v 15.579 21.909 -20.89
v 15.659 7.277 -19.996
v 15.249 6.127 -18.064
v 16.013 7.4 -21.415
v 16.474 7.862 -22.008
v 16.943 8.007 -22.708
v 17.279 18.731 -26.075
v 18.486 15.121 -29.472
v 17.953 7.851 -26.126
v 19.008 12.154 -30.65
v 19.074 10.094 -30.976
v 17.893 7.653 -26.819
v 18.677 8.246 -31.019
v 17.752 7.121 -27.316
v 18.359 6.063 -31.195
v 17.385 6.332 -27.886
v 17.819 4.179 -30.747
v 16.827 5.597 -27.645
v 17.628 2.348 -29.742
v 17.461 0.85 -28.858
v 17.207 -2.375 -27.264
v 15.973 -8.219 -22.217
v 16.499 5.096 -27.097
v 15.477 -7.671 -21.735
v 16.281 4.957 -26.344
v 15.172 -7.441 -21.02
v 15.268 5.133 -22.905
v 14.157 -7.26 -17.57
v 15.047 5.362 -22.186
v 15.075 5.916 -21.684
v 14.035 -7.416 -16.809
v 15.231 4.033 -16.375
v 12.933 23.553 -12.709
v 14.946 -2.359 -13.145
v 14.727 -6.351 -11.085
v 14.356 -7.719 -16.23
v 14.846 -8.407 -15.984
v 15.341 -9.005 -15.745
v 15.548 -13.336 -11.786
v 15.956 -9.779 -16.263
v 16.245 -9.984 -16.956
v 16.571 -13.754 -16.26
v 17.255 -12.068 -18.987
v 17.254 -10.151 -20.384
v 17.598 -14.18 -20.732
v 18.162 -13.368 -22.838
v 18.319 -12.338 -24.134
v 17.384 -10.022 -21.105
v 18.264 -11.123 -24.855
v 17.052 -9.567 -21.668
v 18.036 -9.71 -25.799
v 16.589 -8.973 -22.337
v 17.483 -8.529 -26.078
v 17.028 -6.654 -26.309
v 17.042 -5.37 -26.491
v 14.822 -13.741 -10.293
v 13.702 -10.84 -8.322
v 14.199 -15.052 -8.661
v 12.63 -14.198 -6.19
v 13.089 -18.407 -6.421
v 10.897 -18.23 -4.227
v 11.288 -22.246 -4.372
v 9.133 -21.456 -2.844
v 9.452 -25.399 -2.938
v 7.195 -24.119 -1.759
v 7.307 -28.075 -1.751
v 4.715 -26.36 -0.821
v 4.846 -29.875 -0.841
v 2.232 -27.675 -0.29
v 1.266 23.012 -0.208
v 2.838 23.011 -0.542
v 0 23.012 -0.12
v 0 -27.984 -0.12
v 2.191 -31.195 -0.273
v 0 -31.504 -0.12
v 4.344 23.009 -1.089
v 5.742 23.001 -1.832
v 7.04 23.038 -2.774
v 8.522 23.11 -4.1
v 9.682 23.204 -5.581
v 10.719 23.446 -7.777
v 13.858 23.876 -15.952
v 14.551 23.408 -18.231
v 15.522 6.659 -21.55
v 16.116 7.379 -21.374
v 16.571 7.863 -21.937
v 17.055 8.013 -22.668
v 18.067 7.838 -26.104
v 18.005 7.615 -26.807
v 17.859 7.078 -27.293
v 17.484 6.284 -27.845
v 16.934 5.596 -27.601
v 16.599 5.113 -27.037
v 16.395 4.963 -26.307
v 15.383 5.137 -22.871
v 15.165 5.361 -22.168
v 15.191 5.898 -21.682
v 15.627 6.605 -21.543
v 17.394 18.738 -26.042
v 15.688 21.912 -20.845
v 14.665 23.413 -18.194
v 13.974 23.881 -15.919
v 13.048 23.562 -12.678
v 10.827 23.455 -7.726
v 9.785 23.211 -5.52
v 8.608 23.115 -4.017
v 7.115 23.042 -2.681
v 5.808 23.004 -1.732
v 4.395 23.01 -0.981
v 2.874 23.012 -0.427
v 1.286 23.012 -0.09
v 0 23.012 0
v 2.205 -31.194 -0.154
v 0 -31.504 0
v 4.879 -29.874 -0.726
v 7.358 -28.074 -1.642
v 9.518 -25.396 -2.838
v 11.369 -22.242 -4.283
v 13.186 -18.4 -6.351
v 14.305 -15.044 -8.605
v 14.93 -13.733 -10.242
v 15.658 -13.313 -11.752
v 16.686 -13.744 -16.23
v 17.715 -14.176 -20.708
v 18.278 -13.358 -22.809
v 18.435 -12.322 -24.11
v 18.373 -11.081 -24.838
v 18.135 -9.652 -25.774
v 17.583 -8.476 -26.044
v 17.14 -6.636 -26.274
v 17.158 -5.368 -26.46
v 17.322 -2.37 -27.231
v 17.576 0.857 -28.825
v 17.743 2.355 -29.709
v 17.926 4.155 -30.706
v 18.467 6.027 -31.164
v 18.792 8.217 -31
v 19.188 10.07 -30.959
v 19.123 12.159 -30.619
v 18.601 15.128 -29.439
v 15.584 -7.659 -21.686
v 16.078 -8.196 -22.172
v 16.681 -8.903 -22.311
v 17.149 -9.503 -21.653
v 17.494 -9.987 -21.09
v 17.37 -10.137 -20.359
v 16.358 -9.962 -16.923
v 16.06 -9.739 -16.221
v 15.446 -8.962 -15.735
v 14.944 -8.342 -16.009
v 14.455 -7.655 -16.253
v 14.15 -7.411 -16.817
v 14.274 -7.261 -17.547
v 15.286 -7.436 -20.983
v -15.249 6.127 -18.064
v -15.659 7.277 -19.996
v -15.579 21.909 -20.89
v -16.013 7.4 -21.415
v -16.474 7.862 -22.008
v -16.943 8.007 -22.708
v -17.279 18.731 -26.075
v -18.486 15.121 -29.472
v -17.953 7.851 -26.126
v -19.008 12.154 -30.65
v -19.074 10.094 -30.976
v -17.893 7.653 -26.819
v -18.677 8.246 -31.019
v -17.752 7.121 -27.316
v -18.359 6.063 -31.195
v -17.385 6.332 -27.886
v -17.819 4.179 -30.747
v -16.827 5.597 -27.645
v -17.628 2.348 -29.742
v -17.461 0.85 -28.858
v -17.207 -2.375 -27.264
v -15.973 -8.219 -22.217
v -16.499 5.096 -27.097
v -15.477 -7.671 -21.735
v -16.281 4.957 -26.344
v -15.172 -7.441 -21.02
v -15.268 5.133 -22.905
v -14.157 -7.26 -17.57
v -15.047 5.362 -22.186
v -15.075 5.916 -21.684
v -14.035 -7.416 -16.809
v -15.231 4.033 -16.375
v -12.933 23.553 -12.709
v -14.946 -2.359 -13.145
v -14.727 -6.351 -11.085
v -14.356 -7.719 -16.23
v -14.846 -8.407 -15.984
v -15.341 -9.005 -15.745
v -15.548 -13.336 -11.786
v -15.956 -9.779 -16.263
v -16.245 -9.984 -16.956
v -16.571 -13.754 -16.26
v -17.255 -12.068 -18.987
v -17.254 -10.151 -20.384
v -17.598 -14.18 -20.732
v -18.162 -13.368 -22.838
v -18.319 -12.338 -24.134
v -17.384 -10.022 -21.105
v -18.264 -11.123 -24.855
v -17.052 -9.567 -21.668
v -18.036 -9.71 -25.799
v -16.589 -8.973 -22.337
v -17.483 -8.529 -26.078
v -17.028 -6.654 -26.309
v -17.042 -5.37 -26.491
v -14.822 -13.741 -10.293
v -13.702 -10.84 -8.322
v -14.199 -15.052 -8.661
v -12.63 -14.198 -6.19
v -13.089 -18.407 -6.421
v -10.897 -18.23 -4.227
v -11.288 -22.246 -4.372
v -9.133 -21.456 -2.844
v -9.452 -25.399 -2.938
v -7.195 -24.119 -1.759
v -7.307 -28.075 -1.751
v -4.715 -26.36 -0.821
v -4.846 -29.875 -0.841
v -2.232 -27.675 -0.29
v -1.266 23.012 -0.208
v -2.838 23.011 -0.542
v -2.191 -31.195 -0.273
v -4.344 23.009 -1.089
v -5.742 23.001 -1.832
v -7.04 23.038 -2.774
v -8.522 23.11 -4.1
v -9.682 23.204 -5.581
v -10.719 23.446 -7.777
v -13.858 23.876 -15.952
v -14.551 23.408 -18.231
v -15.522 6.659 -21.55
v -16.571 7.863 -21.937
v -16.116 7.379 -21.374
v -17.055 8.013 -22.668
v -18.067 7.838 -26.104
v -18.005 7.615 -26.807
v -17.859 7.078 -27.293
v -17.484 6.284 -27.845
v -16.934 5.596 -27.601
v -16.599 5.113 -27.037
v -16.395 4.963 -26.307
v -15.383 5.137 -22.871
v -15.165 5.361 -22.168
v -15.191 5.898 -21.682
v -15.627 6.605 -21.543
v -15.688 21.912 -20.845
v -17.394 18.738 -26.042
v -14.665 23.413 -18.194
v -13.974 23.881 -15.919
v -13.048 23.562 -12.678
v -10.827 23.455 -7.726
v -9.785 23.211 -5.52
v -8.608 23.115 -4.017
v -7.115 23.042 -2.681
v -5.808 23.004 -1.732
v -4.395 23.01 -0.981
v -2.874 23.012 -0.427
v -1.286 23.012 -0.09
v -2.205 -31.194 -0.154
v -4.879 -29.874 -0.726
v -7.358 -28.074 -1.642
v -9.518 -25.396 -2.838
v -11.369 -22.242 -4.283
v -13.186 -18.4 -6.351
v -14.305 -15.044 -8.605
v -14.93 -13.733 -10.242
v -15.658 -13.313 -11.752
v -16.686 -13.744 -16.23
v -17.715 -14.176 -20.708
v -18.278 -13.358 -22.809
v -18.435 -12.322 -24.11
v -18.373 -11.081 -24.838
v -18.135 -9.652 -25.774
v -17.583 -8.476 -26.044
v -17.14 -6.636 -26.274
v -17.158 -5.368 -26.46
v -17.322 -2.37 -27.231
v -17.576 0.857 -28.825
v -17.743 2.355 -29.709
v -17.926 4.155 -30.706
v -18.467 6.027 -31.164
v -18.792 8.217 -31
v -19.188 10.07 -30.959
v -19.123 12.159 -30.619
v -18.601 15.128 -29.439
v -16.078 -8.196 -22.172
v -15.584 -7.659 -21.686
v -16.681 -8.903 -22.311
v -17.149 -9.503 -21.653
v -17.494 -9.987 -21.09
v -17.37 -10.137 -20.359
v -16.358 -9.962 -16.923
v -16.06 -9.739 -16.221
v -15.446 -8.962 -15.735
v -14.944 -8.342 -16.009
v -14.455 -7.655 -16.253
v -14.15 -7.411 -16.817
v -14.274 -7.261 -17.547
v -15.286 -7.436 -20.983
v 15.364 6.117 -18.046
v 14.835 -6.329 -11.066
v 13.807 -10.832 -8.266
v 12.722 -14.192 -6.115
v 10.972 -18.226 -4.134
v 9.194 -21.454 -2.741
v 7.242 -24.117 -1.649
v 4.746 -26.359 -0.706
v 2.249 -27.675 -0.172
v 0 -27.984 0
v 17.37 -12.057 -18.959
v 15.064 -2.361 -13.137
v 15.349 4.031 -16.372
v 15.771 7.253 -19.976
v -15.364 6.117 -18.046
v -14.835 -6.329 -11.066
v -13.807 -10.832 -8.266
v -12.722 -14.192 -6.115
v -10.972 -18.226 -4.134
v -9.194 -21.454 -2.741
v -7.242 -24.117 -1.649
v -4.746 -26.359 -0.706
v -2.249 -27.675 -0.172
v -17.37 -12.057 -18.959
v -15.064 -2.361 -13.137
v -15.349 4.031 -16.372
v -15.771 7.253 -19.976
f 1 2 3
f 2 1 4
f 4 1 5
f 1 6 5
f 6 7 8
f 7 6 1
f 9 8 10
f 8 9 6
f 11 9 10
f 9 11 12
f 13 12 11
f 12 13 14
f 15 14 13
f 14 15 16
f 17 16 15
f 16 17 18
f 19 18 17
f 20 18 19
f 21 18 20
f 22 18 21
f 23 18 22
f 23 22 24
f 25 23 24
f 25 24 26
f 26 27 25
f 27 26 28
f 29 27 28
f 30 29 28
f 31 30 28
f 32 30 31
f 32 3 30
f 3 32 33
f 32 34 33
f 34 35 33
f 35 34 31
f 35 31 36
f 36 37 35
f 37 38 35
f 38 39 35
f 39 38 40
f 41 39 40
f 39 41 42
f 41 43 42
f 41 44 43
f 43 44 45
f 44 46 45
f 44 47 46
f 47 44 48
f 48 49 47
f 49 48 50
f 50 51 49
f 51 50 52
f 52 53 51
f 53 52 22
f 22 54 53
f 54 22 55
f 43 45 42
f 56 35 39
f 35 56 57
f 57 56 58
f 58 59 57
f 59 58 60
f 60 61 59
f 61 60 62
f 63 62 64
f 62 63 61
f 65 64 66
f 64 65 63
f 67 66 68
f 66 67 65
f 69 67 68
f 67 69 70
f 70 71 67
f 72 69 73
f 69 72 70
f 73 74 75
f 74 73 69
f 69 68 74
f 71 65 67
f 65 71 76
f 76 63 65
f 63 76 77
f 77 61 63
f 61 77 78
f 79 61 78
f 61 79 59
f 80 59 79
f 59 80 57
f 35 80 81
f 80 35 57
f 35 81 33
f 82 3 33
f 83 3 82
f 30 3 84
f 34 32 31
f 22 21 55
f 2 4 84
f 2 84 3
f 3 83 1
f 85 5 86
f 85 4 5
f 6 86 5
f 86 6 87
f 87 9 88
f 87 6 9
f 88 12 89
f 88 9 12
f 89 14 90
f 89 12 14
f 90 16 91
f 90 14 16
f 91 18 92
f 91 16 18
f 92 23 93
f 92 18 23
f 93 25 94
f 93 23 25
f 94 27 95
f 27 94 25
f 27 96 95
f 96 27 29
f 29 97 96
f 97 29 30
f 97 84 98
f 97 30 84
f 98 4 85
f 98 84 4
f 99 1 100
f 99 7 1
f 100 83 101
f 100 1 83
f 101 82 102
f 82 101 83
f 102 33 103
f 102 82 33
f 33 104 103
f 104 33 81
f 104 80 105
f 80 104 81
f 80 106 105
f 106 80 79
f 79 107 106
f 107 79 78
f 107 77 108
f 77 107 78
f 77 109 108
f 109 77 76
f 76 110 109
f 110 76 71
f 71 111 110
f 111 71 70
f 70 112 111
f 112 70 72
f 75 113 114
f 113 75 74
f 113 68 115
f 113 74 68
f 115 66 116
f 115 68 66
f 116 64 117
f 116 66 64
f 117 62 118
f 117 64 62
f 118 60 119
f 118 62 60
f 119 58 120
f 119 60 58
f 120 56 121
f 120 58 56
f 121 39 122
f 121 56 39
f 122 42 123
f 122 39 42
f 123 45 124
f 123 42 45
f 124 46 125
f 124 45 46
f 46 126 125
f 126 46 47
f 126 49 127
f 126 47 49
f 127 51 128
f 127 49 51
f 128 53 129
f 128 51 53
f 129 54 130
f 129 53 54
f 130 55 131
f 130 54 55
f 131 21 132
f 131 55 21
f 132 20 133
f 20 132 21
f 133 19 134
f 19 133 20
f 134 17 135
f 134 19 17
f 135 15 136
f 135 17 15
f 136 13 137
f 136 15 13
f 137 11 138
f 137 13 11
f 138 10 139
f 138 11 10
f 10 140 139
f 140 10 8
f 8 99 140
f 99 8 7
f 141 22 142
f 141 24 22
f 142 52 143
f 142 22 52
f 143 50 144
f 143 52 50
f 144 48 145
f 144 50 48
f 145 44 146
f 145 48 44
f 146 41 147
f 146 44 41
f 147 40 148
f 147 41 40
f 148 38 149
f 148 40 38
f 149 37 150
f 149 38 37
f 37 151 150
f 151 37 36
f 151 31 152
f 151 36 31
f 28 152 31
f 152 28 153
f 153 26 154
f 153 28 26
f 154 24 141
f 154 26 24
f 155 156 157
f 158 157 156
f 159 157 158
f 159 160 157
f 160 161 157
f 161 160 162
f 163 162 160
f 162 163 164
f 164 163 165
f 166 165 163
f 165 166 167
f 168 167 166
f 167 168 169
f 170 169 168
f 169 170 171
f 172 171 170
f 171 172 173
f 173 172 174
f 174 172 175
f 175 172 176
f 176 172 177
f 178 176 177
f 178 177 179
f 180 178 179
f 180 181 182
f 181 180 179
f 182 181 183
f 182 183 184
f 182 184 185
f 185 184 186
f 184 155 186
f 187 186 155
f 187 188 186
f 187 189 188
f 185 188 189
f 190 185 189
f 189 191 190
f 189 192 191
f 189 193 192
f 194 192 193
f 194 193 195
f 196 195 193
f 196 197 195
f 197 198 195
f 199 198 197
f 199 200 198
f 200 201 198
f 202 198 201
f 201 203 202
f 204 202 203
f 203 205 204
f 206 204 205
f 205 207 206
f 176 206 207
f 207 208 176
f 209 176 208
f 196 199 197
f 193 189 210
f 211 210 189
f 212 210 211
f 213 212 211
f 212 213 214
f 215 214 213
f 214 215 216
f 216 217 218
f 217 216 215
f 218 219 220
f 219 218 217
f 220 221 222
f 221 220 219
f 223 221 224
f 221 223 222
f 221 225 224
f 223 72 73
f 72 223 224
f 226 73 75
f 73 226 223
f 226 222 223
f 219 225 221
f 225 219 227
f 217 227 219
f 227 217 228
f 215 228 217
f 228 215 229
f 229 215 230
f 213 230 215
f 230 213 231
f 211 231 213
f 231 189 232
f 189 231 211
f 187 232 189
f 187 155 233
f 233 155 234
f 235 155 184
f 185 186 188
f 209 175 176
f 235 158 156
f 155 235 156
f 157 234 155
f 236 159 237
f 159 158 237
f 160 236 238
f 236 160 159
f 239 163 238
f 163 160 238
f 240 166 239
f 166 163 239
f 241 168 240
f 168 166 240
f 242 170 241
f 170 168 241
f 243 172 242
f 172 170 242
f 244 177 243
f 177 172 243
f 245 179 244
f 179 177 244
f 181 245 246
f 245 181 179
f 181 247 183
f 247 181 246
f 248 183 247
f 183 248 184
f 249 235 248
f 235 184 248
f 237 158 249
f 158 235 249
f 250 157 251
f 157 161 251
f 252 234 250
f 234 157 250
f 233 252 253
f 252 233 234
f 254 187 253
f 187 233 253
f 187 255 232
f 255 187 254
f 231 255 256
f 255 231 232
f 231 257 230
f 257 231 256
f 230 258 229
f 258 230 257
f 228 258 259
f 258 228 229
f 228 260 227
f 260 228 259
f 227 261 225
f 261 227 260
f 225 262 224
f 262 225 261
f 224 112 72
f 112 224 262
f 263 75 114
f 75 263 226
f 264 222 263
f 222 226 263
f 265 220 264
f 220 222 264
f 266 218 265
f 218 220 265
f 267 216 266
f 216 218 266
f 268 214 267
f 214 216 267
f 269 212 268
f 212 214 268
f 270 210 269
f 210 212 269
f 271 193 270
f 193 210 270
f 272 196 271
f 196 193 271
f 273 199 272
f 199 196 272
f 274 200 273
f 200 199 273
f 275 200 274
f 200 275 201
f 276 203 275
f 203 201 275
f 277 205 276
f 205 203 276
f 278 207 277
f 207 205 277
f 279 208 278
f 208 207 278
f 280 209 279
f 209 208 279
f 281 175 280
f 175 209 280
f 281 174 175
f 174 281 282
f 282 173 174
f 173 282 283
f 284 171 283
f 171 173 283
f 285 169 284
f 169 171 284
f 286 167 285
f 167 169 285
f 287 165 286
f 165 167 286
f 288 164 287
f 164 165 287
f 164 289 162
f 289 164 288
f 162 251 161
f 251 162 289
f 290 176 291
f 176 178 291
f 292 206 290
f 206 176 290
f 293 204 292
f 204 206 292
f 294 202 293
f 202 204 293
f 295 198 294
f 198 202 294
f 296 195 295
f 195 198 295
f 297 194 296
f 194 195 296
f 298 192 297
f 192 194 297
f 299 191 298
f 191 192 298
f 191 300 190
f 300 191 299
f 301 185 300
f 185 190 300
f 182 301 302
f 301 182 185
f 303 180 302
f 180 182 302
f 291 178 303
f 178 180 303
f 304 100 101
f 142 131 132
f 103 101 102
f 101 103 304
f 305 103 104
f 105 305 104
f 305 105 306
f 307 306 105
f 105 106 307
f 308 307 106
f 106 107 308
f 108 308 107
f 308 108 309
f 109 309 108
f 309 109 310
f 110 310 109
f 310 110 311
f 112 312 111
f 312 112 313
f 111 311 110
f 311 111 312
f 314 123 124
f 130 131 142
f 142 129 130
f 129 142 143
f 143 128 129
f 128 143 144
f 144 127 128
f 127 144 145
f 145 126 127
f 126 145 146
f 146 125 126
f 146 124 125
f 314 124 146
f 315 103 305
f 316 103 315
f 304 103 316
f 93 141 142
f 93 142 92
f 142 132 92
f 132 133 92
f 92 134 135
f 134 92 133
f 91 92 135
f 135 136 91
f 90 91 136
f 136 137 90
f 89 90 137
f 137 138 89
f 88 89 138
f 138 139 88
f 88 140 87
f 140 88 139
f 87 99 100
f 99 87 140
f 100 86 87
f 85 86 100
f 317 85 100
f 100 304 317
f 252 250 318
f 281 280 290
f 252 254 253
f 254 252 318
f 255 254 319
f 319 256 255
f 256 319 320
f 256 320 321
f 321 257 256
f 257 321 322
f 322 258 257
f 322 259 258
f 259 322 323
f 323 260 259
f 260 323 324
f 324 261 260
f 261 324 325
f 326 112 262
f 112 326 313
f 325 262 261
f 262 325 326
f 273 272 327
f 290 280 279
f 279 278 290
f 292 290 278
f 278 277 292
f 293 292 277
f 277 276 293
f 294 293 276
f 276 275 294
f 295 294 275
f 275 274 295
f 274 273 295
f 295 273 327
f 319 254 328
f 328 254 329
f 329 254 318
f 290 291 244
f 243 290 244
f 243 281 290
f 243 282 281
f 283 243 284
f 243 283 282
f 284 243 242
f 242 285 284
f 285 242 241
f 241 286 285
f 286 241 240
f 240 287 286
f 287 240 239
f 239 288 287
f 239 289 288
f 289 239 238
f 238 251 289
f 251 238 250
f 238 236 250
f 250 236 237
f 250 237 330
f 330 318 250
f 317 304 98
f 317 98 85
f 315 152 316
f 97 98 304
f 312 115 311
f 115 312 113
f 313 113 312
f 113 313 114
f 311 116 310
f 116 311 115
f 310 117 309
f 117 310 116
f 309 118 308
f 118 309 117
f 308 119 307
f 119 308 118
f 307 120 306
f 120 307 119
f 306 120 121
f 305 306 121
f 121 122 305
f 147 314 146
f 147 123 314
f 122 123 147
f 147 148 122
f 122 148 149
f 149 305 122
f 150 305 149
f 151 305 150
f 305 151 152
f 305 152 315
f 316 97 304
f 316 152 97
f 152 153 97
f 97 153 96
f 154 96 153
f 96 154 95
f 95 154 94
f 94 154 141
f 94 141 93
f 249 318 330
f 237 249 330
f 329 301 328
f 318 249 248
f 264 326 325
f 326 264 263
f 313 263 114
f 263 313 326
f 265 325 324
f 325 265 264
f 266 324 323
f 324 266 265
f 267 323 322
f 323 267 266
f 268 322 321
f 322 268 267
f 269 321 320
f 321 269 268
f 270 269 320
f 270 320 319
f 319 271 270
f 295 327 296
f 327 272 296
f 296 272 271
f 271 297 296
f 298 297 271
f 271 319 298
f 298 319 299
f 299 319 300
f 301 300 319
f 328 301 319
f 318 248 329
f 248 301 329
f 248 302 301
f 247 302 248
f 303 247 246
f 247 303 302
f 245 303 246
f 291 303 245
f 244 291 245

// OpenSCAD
use <../lib.scad>
use <s/67144c01s01.scad>
use <s/67144c01s02.scad>
use <s/67144c01s03.scad>
function ldraw_lib__67144p01c01() = [
// 0 Sheet Plastic  8.5 x  7 Motorcycle Windscreen with Red Border Pattern (Formed)
// 0 Name: 67144p01c01.dat
// 0 Author: Philippe Hurbain [Philo]
// 0 !LDRAW_ORG Part UPDATE 2024-08
// 0 !LICENSE Licensed under CC BY 4.0 : see CAreadme.txt
// 
// 0 !HELP Positioning:
// 0 !HELP 1 47 0 0 0 1 0 0 0 0.988 -0.152 0 0.152 0.988 67144p01c01.dat
// 0 !HELP 1 4 40 50 -58 1 0 0.259 -0.259 0 0.965 0 -1 0 21459.dat
// 0 !HELP 1 4 -40 50 -58 1 0 -0.259 0.259 0 0.965 0 -1 0 21459.dat
// 0 !HELP 1 4 20 30 -54 0 -1 0 -1 0 0 0 0 -1 87080.dat
// 0 !HELP 1 4 -20 30 -54 0 1 0 1 0 0 0 0 -1 87086.dat
// 
// 0 BFC CERTIFY CCW
  [0,"BFC","CERTIFY"],
  [0,"BFC","CCW"],
// 
// 0 !CATEGORY Sheet Plastic
// 0 !KEYWORDS bike, Ducati Panigale, Set 42107
// 
// 0 !HISTORY 2024-09-30 [OrionP] Official Update 2024-08
// 
// 1 16 0 0 0 1 0 0 0 1 0 0 0 1 s\67144c01s01.dat
  [1,16,0,0,0,1,0,0,0,1,0,0,0,1, ldraw_lib__s__67144c01s01()],
// 1 16 0 0 0 -1 0 0 0 1 0 0 0 1 s\67144c01s01.dat
  [1,16,0,0,0,-1,0,0,0,1,0,0,0,1, ldraw_lib__s__67144c01s01()],
// 1 16 0 0 0 1 0 0 0 1 0 0 0 1 s\67144c01s02.dat
  [1,16,0,0,0,1,0,0,0,1,0,0,0,1, ldraw_lib__s__67144c01s02()],
// 1 16 0 0 0 -1 0 0 0 1 0 0 0 1 s\67144c01s02.dat
  [1,16,0,0,0,-1,0,0,0,1,0,0,0,1, ldraw_lib__s__67144c01s02()],
// 0 BFC NOCLIP
  [0,"BFC","NOCLIP"],
// 1 4 0 0 0 1 0 0 0 1 0 0 0 1 s\67144c01s03.dat
  [1,4,0,0,0,1,0,0,0,1,0,0,0,1, ldraw_lib__s__67144c01s03()],
// 1 4 0 0 0 -1 0 0 0 1 0 0 0 1 s\67144c01s03.dat
  [1,4,0,0,0,-1,0,0,0,1,0,0,0,1, ldraw_lib__s__67144c01s03()],
];
module ldraw_lib__67144p01c01(step=0, col=false, unit=2/5, alt=false, line=0.2, solid=!$preview)
    makepoly(ldraw_lib__67144p01c01(), step=step, col=col, unit=unit, alt=alt, line=line, solid=solid);
ldraw_lib__67144p01c01(line=0.2);
